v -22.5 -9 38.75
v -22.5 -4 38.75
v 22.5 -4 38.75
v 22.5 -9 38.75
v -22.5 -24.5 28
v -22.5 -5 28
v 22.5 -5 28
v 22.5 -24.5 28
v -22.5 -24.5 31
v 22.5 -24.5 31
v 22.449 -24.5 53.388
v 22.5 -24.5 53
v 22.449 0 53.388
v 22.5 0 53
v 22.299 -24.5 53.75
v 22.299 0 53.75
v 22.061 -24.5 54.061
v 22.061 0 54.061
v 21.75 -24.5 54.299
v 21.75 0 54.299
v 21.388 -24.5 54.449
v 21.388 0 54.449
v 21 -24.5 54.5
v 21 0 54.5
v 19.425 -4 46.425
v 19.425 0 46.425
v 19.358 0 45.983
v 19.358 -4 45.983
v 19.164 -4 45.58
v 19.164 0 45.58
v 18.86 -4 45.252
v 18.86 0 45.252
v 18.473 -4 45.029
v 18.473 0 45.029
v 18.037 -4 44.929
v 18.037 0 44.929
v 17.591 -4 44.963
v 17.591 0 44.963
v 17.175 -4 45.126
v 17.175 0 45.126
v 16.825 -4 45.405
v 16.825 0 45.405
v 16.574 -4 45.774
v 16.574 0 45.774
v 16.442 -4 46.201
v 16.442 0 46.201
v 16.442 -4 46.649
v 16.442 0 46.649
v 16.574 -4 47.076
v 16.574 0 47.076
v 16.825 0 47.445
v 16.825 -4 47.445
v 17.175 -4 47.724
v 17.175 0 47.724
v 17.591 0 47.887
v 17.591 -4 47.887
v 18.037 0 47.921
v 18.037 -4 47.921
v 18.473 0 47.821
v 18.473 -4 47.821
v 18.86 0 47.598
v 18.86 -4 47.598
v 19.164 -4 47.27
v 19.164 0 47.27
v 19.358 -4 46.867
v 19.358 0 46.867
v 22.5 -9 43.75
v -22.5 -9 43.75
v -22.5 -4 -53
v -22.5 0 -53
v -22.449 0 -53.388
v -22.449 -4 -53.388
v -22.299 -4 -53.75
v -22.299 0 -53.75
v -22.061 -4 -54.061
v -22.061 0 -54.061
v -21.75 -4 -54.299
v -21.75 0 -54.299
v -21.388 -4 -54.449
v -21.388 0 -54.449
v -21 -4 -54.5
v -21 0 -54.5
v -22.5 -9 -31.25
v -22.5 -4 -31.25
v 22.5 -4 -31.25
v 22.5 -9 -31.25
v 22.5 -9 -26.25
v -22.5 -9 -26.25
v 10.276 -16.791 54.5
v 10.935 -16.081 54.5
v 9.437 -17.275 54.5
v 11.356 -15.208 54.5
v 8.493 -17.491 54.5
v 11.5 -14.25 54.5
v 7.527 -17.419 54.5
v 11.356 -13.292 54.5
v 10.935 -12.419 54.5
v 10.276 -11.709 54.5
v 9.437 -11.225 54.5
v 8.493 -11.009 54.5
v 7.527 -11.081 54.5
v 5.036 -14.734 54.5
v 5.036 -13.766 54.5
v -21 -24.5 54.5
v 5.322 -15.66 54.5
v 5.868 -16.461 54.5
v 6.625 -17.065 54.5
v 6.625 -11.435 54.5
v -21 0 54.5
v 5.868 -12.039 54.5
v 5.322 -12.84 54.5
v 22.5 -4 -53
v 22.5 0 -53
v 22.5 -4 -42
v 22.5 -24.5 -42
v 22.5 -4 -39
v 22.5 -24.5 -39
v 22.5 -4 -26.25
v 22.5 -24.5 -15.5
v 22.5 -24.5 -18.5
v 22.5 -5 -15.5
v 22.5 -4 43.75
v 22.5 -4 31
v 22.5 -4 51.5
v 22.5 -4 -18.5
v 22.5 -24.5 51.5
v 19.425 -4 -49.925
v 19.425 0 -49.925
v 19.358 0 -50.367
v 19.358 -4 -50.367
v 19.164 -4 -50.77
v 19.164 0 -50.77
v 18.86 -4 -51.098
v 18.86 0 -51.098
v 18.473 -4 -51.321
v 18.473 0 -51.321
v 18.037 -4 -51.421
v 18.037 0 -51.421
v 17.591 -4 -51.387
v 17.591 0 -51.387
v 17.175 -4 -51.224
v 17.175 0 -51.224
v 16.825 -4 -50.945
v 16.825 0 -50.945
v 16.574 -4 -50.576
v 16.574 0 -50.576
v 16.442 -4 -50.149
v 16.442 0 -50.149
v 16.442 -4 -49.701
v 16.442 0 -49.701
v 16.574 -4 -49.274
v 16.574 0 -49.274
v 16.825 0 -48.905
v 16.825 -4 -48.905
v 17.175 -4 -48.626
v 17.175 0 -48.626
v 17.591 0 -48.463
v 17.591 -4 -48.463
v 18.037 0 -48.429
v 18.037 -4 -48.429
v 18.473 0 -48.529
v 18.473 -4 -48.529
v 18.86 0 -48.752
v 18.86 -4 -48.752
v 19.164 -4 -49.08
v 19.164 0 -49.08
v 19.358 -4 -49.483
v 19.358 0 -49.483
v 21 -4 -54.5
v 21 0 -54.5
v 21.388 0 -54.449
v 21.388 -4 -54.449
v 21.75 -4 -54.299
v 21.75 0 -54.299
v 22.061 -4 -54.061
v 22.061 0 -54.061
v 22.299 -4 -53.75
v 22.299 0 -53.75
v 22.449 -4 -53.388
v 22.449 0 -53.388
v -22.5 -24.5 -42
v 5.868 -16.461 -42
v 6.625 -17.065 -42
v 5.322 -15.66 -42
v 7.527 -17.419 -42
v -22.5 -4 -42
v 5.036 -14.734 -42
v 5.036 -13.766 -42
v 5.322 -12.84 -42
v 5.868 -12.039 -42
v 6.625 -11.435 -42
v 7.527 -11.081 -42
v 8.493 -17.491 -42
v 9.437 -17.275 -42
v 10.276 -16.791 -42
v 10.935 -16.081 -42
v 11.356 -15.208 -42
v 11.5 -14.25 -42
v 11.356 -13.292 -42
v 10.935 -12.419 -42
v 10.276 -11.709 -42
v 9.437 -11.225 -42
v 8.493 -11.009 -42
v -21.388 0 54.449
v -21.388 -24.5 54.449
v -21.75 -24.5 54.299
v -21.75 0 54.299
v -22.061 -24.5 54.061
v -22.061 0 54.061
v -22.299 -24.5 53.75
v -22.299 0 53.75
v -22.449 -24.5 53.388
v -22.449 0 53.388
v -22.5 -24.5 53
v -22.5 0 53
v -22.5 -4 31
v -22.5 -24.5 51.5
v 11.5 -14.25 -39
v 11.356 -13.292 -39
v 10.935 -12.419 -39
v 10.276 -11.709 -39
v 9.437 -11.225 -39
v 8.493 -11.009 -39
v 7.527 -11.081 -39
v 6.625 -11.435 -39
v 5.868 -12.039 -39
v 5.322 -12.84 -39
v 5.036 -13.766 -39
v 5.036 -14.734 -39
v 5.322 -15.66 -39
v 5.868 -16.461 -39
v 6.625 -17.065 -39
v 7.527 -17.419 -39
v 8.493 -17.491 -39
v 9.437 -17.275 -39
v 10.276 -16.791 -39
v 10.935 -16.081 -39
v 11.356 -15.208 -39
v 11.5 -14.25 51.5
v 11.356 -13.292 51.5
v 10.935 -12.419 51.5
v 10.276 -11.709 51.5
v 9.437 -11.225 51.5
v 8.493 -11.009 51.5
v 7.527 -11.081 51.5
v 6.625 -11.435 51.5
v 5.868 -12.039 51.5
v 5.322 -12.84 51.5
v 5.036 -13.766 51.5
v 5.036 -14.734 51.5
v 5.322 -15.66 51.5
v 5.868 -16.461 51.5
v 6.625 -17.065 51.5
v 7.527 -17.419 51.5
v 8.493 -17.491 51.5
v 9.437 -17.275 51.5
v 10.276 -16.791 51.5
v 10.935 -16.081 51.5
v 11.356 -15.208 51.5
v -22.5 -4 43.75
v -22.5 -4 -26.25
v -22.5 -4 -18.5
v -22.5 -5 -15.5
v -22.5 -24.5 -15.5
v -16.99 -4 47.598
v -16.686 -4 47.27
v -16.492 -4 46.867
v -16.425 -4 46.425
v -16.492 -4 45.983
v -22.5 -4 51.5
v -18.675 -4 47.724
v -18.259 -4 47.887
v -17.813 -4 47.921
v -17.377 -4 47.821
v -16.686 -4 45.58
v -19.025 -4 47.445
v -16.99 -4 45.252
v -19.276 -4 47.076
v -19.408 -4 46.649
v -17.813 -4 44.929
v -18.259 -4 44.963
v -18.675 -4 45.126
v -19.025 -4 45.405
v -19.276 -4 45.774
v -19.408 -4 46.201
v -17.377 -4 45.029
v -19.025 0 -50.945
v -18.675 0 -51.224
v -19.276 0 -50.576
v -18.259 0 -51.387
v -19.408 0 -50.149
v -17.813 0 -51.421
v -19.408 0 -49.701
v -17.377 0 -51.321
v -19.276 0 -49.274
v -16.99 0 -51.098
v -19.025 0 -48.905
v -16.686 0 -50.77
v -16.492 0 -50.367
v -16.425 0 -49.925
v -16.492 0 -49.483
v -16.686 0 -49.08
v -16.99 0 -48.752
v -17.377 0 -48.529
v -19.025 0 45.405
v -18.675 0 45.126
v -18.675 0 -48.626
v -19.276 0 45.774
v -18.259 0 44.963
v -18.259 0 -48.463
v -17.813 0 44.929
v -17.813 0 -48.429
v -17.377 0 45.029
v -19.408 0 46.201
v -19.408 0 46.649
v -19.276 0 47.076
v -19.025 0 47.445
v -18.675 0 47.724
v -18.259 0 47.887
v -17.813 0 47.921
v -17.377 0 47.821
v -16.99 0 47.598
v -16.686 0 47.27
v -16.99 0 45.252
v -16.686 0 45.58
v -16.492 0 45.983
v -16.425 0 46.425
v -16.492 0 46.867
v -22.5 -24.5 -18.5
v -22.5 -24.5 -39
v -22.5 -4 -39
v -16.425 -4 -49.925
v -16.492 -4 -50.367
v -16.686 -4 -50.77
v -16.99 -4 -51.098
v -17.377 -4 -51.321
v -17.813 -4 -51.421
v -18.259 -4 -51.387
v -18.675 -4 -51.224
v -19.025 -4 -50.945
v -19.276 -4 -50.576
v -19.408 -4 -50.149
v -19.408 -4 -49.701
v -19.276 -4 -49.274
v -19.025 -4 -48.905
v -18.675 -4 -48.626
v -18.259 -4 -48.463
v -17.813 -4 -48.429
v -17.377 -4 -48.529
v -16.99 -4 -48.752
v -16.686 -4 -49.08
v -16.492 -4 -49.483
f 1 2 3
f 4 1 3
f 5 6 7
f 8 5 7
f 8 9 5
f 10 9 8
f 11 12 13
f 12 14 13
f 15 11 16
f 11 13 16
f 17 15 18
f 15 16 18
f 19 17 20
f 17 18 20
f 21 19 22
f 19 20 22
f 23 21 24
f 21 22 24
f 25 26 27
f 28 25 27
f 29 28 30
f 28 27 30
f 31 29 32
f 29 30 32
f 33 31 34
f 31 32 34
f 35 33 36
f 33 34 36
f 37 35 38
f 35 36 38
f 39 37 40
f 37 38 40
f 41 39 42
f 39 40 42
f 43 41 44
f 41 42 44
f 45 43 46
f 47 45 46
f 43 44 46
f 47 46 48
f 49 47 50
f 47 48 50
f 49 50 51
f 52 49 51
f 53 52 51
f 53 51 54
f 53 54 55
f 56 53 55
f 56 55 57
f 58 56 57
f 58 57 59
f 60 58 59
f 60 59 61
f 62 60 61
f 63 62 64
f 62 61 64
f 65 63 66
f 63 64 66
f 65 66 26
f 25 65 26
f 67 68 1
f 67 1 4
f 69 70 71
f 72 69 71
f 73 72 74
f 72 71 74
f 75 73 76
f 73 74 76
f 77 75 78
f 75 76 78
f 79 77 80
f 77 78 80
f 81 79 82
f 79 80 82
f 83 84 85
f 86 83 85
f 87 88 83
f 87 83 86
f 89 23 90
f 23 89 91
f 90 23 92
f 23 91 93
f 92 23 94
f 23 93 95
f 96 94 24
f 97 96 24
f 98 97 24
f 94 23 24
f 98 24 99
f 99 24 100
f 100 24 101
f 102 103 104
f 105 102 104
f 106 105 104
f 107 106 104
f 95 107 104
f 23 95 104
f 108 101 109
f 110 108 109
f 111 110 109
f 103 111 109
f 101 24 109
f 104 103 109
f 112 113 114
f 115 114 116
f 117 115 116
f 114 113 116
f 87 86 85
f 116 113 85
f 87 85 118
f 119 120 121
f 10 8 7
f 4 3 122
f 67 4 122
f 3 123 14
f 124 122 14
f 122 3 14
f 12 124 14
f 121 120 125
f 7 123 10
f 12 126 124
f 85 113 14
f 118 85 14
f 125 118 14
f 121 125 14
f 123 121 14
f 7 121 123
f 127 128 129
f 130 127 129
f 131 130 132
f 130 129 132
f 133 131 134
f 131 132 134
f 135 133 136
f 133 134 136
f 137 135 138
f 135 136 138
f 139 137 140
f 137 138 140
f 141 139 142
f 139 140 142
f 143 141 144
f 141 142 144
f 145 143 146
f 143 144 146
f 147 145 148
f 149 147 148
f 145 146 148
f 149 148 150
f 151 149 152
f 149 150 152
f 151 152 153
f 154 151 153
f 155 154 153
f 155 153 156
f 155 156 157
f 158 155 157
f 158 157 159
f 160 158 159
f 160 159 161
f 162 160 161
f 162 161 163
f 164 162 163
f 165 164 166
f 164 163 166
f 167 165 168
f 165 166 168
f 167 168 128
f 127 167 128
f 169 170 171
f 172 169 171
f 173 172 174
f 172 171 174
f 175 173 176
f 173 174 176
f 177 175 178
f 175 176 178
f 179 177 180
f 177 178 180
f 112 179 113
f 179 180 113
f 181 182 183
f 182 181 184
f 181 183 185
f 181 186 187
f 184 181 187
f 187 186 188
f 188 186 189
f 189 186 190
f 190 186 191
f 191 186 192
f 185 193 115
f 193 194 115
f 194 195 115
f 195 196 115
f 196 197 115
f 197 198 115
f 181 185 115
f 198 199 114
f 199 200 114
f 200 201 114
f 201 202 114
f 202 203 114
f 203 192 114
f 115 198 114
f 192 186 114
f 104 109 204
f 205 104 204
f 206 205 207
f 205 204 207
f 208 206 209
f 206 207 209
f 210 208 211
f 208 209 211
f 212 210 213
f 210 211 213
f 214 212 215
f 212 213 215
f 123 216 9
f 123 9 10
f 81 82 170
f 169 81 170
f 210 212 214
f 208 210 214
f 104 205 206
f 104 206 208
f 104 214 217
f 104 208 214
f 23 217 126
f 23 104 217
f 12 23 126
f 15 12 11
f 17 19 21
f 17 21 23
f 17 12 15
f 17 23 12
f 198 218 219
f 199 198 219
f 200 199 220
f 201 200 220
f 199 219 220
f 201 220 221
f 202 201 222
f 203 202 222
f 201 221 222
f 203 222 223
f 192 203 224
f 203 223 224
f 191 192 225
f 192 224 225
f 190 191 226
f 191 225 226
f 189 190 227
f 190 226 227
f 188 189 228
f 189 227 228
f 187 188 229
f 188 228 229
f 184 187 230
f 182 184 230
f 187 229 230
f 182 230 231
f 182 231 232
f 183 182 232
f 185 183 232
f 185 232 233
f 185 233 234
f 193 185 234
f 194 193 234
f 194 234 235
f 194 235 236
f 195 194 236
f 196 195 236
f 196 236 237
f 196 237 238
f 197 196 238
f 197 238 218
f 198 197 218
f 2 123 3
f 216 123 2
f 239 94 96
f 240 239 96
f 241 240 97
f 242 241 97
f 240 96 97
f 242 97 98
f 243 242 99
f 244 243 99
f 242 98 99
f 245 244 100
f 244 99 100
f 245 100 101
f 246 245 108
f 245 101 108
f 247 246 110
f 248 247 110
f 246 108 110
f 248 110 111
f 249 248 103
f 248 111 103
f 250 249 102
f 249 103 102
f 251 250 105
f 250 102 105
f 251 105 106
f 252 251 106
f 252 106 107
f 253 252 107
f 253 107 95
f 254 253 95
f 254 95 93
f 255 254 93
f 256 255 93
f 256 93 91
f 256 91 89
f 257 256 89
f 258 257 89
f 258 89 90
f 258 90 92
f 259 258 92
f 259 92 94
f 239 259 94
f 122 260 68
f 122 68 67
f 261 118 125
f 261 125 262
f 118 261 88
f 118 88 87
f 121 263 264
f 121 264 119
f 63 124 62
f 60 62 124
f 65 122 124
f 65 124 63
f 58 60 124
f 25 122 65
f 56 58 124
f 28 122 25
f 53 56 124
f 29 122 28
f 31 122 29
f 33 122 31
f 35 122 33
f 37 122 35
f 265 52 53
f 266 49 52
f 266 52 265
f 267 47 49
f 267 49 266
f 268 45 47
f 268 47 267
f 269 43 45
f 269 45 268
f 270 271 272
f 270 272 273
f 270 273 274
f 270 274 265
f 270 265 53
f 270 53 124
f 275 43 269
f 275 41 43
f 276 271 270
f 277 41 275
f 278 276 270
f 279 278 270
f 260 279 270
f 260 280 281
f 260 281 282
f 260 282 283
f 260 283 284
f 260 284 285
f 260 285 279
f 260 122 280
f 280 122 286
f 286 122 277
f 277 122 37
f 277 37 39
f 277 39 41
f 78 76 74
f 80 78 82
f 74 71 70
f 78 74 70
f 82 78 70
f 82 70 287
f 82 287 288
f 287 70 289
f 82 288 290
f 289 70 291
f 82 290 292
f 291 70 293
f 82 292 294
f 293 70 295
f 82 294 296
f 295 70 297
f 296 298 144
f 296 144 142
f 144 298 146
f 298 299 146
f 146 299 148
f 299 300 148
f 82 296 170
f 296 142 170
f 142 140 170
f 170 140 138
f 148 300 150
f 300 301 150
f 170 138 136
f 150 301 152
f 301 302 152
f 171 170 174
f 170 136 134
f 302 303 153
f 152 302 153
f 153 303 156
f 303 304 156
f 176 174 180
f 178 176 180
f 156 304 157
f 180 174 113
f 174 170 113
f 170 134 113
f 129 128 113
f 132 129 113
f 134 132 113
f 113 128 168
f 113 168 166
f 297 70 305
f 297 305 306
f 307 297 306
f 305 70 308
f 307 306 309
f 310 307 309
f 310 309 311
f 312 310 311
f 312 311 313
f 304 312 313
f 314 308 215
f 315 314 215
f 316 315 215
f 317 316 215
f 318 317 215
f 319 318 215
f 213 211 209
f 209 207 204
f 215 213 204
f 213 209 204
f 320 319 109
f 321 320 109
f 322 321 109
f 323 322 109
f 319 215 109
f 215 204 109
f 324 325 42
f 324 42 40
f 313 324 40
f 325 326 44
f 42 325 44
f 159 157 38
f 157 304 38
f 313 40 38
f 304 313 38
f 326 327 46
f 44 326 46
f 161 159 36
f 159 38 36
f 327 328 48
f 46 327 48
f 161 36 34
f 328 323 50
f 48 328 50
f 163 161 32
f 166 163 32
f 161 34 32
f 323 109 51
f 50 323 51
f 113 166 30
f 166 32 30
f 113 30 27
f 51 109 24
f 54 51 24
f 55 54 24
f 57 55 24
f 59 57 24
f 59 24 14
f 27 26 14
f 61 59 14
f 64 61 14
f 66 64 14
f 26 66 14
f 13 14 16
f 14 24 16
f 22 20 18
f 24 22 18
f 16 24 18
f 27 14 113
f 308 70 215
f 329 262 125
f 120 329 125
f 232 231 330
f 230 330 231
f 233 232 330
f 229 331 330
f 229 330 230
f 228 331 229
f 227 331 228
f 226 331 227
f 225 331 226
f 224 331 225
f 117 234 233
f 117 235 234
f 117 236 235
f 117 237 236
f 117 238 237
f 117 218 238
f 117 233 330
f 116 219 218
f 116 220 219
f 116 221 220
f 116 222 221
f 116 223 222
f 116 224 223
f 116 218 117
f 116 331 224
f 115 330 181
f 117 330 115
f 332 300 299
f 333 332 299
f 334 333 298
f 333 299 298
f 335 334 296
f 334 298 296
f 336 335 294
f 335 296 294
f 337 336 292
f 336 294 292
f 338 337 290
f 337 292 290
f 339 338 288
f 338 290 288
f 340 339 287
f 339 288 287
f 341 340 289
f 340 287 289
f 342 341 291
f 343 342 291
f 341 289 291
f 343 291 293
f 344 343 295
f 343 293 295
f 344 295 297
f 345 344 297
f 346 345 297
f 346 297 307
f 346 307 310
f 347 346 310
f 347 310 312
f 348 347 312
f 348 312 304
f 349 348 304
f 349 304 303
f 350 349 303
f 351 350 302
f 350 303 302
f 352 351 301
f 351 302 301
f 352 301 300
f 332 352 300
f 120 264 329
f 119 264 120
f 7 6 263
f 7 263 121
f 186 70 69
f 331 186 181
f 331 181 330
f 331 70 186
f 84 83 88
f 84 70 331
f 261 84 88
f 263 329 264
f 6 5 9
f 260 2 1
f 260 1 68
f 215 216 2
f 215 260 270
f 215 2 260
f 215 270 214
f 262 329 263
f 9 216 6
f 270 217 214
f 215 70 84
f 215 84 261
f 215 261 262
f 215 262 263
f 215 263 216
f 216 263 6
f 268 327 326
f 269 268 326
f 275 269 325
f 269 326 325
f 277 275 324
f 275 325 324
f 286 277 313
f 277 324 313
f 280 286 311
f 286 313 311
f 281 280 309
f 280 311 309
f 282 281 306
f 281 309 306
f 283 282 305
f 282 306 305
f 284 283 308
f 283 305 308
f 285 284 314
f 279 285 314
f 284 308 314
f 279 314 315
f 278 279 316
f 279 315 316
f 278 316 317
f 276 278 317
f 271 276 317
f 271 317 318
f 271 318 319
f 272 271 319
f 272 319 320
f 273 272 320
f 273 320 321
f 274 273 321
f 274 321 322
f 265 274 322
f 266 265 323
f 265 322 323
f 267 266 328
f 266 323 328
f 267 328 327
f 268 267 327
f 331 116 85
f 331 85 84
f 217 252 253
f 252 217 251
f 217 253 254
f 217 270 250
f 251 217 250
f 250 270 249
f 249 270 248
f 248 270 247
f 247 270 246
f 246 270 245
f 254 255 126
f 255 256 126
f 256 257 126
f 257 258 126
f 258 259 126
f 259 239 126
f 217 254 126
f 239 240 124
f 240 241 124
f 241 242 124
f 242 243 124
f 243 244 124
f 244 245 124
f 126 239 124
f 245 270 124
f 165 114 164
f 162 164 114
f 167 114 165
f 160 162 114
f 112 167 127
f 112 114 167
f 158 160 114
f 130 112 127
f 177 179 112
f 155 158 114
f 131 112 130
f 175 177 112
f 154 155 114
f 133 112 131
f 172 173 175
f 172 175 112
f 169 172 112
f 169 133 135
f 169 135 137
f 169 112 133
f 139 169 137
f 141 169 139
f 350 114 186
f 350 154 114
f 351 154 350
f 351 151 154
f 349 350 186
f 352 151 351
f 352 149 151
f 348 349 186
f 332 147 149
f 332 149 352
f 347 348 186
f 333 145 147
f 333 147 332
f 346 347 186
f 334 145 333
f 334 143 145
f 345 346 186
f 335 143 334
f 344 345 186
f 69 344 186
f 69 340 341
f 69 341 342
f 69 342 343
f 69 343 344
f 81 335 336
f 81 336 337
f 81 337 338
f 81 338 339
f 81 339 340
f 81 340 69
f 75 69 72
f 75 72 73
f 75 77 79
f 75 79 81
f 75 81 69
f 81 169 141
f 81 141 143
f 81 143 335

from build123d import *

# Parameters (mm, degrees)
SKETCH1_R           = 1.5
BOSS_EXTRUDE1_DEPTH = 4
SKETCH3_W           = 45
SKETCH3_H           = 3
SKETCH3_H_2         = 5
BOSS_EXTRUDE2_DEPTH = 20.5
SKETCH4_W           = 45
SKETCH4_H           = 5
CUT_EXTRUDE1_DEPTH  = 15.5
SKETCH5_W           = 45
SKETCH5_H           = 43.5
BOSS_EXTRUDE3_DEPTH = 1
SKETCH6_R           = 3.25
CUT_EXTRUDE2_DEPTH  = 103
SKETCH7_W           = 45
SKETCH7_H           = 3
BOSS_EXTRUDE4_DEPTH = 24.5


with BuildPart() as part:
    # Sketch1 → Boss-Extrude1 (new body)
    with BuildSketch(Plane(origin=(0, 0, 0), x_dir=(1, 0, 0), z_dir=(0, 1, 0))):
        with BuildLine():
            Line((21, -54.5), (-21, -54.5))
            ThreePointArc((-21, -54.5), (-22.060660172, -54.060660172), (-22.5, -53))
            Line((-22.5, -53), (-22.5, 53))
            ThreePointArc((-22.5, 53), (-22.060660172, 54.060660172), (-21, 54.5))
            Line((-21, 54.5), (21, 54.5))
            ThreePointArc((21, 54.5), (22.060660172, 54.060660172), (22.5, 53))
            Line((22.5, 53), (22.5, -53))
            ThreePointArc((22.5, -53), (22.060660172, -54.060660172), (21, -54.5))
        make_face()
        with Locations((17.925, -46.425)):
            Circle(SKETCH1_R, mode=Mode.SUBTRACT)
        with Locations((-17.925, -46.425)):
            Circle(SKETCH1_R, mode=Mode.SUBTRACT)
        with Locations((17.925, 49.925)):
            Circle(SKETCH1_R, mode=Mode.SUBTRACT)
        with Locations((-17.925, 49.925)):
            Circle(SKETCH1_R, mode=Mode.SUBTRACT)
    extrude(amount=-BOSS_EXTRUDE1_DEPTH)

    # Sketch3 → Boss-Extrude2 (add)
    with BuildSketch(Plane.XZ.offset(4)):
        with Locations((0, -17)):
            Rectangle(SKETCH3_W, SKETCH3_H)
        with Locations((0, -28.75)):
            Rectangle(SKETCH3_W, SKETCH3_H_2)
        with Locations((0, -40.5)):
            Rectangle(SKETCH3_W, SKETCH3_H)
        with Locations((0, 41.25)):
            Rectangle(SKETCH3_W, SKETCH3_H_2)
        with BuildLine():
            Line((-22.5, 51.5), (22.5, 51.5))
            Line((22.5, 51.5), (22.5, 53))
            ThreePointArc((22.5, 53), (22.060660172, 54.060660172), (21, 54.5))
            Line((21, 54.5), (-21, 54.5))
            ThreePointArc((-21, 54.5), (-22.060660172, 54.060660172), (-22.5, 53))
            Line((-22.5, 53), (-22.5, 51.5))
        make_face()
        with Locations((0, 29.5)):
            Rectangle(SKETCH3_W, SKETCH3_H)
    extrude(amount=BOSS_EXTRUDE2_DEPTH)

    # Sketch4 → Cut-Extrude1 (cut)
    with BuildSketch(Plane.XZ.offset(24.5)):
        with Locations((0, 41.25)):
            Rectangle(SKETCH4_W, SKETCH4_H)
        with Locations((0, -28.75)):
            Rectangle(SKETCH4_W, SKETCH4_H)
    extrude(amount=-CUT_EXTRUDE1_DEPTH, mode=Mode.SUBTRACT)

    # Sketch5 → Boss-Extrude3 (add)
    with BuildSketch(Plane.XZ.offset(4)):
        with Locations((0, 6.25)):
            Rectangle(SKETCH5_W, SKETCH5_H)
    extrude(amount=BOSS_EXTRUDE3_DEPTH)

    # Sketch6 → Cut-Extrude2 (cut)
    with BuildSketch(Plane.XY.offset(54.5)):
        with Locations((8.25, -14.25)):
            Circle(SKETCH6_R)
    extrude(amount=-CUT_EXTRUDE2_DEPTH, mode=Mode.SUBTRACT)

    # Sketch7 → Boss-Extrude4 (add)
    with BuildSketch(Plane.XZ.offset(24.5)):
        with Locations((0, 29.5)):
            Rectangle(SKETCH7_W, SKETCH7_H)
        with Locations((0, -17)):
            Rectangle(SKETCH7_W, SKETCH7_H)
    extrude(amount=-BOSS_EXTRUDE4_DEPTH)


solid = part.part
